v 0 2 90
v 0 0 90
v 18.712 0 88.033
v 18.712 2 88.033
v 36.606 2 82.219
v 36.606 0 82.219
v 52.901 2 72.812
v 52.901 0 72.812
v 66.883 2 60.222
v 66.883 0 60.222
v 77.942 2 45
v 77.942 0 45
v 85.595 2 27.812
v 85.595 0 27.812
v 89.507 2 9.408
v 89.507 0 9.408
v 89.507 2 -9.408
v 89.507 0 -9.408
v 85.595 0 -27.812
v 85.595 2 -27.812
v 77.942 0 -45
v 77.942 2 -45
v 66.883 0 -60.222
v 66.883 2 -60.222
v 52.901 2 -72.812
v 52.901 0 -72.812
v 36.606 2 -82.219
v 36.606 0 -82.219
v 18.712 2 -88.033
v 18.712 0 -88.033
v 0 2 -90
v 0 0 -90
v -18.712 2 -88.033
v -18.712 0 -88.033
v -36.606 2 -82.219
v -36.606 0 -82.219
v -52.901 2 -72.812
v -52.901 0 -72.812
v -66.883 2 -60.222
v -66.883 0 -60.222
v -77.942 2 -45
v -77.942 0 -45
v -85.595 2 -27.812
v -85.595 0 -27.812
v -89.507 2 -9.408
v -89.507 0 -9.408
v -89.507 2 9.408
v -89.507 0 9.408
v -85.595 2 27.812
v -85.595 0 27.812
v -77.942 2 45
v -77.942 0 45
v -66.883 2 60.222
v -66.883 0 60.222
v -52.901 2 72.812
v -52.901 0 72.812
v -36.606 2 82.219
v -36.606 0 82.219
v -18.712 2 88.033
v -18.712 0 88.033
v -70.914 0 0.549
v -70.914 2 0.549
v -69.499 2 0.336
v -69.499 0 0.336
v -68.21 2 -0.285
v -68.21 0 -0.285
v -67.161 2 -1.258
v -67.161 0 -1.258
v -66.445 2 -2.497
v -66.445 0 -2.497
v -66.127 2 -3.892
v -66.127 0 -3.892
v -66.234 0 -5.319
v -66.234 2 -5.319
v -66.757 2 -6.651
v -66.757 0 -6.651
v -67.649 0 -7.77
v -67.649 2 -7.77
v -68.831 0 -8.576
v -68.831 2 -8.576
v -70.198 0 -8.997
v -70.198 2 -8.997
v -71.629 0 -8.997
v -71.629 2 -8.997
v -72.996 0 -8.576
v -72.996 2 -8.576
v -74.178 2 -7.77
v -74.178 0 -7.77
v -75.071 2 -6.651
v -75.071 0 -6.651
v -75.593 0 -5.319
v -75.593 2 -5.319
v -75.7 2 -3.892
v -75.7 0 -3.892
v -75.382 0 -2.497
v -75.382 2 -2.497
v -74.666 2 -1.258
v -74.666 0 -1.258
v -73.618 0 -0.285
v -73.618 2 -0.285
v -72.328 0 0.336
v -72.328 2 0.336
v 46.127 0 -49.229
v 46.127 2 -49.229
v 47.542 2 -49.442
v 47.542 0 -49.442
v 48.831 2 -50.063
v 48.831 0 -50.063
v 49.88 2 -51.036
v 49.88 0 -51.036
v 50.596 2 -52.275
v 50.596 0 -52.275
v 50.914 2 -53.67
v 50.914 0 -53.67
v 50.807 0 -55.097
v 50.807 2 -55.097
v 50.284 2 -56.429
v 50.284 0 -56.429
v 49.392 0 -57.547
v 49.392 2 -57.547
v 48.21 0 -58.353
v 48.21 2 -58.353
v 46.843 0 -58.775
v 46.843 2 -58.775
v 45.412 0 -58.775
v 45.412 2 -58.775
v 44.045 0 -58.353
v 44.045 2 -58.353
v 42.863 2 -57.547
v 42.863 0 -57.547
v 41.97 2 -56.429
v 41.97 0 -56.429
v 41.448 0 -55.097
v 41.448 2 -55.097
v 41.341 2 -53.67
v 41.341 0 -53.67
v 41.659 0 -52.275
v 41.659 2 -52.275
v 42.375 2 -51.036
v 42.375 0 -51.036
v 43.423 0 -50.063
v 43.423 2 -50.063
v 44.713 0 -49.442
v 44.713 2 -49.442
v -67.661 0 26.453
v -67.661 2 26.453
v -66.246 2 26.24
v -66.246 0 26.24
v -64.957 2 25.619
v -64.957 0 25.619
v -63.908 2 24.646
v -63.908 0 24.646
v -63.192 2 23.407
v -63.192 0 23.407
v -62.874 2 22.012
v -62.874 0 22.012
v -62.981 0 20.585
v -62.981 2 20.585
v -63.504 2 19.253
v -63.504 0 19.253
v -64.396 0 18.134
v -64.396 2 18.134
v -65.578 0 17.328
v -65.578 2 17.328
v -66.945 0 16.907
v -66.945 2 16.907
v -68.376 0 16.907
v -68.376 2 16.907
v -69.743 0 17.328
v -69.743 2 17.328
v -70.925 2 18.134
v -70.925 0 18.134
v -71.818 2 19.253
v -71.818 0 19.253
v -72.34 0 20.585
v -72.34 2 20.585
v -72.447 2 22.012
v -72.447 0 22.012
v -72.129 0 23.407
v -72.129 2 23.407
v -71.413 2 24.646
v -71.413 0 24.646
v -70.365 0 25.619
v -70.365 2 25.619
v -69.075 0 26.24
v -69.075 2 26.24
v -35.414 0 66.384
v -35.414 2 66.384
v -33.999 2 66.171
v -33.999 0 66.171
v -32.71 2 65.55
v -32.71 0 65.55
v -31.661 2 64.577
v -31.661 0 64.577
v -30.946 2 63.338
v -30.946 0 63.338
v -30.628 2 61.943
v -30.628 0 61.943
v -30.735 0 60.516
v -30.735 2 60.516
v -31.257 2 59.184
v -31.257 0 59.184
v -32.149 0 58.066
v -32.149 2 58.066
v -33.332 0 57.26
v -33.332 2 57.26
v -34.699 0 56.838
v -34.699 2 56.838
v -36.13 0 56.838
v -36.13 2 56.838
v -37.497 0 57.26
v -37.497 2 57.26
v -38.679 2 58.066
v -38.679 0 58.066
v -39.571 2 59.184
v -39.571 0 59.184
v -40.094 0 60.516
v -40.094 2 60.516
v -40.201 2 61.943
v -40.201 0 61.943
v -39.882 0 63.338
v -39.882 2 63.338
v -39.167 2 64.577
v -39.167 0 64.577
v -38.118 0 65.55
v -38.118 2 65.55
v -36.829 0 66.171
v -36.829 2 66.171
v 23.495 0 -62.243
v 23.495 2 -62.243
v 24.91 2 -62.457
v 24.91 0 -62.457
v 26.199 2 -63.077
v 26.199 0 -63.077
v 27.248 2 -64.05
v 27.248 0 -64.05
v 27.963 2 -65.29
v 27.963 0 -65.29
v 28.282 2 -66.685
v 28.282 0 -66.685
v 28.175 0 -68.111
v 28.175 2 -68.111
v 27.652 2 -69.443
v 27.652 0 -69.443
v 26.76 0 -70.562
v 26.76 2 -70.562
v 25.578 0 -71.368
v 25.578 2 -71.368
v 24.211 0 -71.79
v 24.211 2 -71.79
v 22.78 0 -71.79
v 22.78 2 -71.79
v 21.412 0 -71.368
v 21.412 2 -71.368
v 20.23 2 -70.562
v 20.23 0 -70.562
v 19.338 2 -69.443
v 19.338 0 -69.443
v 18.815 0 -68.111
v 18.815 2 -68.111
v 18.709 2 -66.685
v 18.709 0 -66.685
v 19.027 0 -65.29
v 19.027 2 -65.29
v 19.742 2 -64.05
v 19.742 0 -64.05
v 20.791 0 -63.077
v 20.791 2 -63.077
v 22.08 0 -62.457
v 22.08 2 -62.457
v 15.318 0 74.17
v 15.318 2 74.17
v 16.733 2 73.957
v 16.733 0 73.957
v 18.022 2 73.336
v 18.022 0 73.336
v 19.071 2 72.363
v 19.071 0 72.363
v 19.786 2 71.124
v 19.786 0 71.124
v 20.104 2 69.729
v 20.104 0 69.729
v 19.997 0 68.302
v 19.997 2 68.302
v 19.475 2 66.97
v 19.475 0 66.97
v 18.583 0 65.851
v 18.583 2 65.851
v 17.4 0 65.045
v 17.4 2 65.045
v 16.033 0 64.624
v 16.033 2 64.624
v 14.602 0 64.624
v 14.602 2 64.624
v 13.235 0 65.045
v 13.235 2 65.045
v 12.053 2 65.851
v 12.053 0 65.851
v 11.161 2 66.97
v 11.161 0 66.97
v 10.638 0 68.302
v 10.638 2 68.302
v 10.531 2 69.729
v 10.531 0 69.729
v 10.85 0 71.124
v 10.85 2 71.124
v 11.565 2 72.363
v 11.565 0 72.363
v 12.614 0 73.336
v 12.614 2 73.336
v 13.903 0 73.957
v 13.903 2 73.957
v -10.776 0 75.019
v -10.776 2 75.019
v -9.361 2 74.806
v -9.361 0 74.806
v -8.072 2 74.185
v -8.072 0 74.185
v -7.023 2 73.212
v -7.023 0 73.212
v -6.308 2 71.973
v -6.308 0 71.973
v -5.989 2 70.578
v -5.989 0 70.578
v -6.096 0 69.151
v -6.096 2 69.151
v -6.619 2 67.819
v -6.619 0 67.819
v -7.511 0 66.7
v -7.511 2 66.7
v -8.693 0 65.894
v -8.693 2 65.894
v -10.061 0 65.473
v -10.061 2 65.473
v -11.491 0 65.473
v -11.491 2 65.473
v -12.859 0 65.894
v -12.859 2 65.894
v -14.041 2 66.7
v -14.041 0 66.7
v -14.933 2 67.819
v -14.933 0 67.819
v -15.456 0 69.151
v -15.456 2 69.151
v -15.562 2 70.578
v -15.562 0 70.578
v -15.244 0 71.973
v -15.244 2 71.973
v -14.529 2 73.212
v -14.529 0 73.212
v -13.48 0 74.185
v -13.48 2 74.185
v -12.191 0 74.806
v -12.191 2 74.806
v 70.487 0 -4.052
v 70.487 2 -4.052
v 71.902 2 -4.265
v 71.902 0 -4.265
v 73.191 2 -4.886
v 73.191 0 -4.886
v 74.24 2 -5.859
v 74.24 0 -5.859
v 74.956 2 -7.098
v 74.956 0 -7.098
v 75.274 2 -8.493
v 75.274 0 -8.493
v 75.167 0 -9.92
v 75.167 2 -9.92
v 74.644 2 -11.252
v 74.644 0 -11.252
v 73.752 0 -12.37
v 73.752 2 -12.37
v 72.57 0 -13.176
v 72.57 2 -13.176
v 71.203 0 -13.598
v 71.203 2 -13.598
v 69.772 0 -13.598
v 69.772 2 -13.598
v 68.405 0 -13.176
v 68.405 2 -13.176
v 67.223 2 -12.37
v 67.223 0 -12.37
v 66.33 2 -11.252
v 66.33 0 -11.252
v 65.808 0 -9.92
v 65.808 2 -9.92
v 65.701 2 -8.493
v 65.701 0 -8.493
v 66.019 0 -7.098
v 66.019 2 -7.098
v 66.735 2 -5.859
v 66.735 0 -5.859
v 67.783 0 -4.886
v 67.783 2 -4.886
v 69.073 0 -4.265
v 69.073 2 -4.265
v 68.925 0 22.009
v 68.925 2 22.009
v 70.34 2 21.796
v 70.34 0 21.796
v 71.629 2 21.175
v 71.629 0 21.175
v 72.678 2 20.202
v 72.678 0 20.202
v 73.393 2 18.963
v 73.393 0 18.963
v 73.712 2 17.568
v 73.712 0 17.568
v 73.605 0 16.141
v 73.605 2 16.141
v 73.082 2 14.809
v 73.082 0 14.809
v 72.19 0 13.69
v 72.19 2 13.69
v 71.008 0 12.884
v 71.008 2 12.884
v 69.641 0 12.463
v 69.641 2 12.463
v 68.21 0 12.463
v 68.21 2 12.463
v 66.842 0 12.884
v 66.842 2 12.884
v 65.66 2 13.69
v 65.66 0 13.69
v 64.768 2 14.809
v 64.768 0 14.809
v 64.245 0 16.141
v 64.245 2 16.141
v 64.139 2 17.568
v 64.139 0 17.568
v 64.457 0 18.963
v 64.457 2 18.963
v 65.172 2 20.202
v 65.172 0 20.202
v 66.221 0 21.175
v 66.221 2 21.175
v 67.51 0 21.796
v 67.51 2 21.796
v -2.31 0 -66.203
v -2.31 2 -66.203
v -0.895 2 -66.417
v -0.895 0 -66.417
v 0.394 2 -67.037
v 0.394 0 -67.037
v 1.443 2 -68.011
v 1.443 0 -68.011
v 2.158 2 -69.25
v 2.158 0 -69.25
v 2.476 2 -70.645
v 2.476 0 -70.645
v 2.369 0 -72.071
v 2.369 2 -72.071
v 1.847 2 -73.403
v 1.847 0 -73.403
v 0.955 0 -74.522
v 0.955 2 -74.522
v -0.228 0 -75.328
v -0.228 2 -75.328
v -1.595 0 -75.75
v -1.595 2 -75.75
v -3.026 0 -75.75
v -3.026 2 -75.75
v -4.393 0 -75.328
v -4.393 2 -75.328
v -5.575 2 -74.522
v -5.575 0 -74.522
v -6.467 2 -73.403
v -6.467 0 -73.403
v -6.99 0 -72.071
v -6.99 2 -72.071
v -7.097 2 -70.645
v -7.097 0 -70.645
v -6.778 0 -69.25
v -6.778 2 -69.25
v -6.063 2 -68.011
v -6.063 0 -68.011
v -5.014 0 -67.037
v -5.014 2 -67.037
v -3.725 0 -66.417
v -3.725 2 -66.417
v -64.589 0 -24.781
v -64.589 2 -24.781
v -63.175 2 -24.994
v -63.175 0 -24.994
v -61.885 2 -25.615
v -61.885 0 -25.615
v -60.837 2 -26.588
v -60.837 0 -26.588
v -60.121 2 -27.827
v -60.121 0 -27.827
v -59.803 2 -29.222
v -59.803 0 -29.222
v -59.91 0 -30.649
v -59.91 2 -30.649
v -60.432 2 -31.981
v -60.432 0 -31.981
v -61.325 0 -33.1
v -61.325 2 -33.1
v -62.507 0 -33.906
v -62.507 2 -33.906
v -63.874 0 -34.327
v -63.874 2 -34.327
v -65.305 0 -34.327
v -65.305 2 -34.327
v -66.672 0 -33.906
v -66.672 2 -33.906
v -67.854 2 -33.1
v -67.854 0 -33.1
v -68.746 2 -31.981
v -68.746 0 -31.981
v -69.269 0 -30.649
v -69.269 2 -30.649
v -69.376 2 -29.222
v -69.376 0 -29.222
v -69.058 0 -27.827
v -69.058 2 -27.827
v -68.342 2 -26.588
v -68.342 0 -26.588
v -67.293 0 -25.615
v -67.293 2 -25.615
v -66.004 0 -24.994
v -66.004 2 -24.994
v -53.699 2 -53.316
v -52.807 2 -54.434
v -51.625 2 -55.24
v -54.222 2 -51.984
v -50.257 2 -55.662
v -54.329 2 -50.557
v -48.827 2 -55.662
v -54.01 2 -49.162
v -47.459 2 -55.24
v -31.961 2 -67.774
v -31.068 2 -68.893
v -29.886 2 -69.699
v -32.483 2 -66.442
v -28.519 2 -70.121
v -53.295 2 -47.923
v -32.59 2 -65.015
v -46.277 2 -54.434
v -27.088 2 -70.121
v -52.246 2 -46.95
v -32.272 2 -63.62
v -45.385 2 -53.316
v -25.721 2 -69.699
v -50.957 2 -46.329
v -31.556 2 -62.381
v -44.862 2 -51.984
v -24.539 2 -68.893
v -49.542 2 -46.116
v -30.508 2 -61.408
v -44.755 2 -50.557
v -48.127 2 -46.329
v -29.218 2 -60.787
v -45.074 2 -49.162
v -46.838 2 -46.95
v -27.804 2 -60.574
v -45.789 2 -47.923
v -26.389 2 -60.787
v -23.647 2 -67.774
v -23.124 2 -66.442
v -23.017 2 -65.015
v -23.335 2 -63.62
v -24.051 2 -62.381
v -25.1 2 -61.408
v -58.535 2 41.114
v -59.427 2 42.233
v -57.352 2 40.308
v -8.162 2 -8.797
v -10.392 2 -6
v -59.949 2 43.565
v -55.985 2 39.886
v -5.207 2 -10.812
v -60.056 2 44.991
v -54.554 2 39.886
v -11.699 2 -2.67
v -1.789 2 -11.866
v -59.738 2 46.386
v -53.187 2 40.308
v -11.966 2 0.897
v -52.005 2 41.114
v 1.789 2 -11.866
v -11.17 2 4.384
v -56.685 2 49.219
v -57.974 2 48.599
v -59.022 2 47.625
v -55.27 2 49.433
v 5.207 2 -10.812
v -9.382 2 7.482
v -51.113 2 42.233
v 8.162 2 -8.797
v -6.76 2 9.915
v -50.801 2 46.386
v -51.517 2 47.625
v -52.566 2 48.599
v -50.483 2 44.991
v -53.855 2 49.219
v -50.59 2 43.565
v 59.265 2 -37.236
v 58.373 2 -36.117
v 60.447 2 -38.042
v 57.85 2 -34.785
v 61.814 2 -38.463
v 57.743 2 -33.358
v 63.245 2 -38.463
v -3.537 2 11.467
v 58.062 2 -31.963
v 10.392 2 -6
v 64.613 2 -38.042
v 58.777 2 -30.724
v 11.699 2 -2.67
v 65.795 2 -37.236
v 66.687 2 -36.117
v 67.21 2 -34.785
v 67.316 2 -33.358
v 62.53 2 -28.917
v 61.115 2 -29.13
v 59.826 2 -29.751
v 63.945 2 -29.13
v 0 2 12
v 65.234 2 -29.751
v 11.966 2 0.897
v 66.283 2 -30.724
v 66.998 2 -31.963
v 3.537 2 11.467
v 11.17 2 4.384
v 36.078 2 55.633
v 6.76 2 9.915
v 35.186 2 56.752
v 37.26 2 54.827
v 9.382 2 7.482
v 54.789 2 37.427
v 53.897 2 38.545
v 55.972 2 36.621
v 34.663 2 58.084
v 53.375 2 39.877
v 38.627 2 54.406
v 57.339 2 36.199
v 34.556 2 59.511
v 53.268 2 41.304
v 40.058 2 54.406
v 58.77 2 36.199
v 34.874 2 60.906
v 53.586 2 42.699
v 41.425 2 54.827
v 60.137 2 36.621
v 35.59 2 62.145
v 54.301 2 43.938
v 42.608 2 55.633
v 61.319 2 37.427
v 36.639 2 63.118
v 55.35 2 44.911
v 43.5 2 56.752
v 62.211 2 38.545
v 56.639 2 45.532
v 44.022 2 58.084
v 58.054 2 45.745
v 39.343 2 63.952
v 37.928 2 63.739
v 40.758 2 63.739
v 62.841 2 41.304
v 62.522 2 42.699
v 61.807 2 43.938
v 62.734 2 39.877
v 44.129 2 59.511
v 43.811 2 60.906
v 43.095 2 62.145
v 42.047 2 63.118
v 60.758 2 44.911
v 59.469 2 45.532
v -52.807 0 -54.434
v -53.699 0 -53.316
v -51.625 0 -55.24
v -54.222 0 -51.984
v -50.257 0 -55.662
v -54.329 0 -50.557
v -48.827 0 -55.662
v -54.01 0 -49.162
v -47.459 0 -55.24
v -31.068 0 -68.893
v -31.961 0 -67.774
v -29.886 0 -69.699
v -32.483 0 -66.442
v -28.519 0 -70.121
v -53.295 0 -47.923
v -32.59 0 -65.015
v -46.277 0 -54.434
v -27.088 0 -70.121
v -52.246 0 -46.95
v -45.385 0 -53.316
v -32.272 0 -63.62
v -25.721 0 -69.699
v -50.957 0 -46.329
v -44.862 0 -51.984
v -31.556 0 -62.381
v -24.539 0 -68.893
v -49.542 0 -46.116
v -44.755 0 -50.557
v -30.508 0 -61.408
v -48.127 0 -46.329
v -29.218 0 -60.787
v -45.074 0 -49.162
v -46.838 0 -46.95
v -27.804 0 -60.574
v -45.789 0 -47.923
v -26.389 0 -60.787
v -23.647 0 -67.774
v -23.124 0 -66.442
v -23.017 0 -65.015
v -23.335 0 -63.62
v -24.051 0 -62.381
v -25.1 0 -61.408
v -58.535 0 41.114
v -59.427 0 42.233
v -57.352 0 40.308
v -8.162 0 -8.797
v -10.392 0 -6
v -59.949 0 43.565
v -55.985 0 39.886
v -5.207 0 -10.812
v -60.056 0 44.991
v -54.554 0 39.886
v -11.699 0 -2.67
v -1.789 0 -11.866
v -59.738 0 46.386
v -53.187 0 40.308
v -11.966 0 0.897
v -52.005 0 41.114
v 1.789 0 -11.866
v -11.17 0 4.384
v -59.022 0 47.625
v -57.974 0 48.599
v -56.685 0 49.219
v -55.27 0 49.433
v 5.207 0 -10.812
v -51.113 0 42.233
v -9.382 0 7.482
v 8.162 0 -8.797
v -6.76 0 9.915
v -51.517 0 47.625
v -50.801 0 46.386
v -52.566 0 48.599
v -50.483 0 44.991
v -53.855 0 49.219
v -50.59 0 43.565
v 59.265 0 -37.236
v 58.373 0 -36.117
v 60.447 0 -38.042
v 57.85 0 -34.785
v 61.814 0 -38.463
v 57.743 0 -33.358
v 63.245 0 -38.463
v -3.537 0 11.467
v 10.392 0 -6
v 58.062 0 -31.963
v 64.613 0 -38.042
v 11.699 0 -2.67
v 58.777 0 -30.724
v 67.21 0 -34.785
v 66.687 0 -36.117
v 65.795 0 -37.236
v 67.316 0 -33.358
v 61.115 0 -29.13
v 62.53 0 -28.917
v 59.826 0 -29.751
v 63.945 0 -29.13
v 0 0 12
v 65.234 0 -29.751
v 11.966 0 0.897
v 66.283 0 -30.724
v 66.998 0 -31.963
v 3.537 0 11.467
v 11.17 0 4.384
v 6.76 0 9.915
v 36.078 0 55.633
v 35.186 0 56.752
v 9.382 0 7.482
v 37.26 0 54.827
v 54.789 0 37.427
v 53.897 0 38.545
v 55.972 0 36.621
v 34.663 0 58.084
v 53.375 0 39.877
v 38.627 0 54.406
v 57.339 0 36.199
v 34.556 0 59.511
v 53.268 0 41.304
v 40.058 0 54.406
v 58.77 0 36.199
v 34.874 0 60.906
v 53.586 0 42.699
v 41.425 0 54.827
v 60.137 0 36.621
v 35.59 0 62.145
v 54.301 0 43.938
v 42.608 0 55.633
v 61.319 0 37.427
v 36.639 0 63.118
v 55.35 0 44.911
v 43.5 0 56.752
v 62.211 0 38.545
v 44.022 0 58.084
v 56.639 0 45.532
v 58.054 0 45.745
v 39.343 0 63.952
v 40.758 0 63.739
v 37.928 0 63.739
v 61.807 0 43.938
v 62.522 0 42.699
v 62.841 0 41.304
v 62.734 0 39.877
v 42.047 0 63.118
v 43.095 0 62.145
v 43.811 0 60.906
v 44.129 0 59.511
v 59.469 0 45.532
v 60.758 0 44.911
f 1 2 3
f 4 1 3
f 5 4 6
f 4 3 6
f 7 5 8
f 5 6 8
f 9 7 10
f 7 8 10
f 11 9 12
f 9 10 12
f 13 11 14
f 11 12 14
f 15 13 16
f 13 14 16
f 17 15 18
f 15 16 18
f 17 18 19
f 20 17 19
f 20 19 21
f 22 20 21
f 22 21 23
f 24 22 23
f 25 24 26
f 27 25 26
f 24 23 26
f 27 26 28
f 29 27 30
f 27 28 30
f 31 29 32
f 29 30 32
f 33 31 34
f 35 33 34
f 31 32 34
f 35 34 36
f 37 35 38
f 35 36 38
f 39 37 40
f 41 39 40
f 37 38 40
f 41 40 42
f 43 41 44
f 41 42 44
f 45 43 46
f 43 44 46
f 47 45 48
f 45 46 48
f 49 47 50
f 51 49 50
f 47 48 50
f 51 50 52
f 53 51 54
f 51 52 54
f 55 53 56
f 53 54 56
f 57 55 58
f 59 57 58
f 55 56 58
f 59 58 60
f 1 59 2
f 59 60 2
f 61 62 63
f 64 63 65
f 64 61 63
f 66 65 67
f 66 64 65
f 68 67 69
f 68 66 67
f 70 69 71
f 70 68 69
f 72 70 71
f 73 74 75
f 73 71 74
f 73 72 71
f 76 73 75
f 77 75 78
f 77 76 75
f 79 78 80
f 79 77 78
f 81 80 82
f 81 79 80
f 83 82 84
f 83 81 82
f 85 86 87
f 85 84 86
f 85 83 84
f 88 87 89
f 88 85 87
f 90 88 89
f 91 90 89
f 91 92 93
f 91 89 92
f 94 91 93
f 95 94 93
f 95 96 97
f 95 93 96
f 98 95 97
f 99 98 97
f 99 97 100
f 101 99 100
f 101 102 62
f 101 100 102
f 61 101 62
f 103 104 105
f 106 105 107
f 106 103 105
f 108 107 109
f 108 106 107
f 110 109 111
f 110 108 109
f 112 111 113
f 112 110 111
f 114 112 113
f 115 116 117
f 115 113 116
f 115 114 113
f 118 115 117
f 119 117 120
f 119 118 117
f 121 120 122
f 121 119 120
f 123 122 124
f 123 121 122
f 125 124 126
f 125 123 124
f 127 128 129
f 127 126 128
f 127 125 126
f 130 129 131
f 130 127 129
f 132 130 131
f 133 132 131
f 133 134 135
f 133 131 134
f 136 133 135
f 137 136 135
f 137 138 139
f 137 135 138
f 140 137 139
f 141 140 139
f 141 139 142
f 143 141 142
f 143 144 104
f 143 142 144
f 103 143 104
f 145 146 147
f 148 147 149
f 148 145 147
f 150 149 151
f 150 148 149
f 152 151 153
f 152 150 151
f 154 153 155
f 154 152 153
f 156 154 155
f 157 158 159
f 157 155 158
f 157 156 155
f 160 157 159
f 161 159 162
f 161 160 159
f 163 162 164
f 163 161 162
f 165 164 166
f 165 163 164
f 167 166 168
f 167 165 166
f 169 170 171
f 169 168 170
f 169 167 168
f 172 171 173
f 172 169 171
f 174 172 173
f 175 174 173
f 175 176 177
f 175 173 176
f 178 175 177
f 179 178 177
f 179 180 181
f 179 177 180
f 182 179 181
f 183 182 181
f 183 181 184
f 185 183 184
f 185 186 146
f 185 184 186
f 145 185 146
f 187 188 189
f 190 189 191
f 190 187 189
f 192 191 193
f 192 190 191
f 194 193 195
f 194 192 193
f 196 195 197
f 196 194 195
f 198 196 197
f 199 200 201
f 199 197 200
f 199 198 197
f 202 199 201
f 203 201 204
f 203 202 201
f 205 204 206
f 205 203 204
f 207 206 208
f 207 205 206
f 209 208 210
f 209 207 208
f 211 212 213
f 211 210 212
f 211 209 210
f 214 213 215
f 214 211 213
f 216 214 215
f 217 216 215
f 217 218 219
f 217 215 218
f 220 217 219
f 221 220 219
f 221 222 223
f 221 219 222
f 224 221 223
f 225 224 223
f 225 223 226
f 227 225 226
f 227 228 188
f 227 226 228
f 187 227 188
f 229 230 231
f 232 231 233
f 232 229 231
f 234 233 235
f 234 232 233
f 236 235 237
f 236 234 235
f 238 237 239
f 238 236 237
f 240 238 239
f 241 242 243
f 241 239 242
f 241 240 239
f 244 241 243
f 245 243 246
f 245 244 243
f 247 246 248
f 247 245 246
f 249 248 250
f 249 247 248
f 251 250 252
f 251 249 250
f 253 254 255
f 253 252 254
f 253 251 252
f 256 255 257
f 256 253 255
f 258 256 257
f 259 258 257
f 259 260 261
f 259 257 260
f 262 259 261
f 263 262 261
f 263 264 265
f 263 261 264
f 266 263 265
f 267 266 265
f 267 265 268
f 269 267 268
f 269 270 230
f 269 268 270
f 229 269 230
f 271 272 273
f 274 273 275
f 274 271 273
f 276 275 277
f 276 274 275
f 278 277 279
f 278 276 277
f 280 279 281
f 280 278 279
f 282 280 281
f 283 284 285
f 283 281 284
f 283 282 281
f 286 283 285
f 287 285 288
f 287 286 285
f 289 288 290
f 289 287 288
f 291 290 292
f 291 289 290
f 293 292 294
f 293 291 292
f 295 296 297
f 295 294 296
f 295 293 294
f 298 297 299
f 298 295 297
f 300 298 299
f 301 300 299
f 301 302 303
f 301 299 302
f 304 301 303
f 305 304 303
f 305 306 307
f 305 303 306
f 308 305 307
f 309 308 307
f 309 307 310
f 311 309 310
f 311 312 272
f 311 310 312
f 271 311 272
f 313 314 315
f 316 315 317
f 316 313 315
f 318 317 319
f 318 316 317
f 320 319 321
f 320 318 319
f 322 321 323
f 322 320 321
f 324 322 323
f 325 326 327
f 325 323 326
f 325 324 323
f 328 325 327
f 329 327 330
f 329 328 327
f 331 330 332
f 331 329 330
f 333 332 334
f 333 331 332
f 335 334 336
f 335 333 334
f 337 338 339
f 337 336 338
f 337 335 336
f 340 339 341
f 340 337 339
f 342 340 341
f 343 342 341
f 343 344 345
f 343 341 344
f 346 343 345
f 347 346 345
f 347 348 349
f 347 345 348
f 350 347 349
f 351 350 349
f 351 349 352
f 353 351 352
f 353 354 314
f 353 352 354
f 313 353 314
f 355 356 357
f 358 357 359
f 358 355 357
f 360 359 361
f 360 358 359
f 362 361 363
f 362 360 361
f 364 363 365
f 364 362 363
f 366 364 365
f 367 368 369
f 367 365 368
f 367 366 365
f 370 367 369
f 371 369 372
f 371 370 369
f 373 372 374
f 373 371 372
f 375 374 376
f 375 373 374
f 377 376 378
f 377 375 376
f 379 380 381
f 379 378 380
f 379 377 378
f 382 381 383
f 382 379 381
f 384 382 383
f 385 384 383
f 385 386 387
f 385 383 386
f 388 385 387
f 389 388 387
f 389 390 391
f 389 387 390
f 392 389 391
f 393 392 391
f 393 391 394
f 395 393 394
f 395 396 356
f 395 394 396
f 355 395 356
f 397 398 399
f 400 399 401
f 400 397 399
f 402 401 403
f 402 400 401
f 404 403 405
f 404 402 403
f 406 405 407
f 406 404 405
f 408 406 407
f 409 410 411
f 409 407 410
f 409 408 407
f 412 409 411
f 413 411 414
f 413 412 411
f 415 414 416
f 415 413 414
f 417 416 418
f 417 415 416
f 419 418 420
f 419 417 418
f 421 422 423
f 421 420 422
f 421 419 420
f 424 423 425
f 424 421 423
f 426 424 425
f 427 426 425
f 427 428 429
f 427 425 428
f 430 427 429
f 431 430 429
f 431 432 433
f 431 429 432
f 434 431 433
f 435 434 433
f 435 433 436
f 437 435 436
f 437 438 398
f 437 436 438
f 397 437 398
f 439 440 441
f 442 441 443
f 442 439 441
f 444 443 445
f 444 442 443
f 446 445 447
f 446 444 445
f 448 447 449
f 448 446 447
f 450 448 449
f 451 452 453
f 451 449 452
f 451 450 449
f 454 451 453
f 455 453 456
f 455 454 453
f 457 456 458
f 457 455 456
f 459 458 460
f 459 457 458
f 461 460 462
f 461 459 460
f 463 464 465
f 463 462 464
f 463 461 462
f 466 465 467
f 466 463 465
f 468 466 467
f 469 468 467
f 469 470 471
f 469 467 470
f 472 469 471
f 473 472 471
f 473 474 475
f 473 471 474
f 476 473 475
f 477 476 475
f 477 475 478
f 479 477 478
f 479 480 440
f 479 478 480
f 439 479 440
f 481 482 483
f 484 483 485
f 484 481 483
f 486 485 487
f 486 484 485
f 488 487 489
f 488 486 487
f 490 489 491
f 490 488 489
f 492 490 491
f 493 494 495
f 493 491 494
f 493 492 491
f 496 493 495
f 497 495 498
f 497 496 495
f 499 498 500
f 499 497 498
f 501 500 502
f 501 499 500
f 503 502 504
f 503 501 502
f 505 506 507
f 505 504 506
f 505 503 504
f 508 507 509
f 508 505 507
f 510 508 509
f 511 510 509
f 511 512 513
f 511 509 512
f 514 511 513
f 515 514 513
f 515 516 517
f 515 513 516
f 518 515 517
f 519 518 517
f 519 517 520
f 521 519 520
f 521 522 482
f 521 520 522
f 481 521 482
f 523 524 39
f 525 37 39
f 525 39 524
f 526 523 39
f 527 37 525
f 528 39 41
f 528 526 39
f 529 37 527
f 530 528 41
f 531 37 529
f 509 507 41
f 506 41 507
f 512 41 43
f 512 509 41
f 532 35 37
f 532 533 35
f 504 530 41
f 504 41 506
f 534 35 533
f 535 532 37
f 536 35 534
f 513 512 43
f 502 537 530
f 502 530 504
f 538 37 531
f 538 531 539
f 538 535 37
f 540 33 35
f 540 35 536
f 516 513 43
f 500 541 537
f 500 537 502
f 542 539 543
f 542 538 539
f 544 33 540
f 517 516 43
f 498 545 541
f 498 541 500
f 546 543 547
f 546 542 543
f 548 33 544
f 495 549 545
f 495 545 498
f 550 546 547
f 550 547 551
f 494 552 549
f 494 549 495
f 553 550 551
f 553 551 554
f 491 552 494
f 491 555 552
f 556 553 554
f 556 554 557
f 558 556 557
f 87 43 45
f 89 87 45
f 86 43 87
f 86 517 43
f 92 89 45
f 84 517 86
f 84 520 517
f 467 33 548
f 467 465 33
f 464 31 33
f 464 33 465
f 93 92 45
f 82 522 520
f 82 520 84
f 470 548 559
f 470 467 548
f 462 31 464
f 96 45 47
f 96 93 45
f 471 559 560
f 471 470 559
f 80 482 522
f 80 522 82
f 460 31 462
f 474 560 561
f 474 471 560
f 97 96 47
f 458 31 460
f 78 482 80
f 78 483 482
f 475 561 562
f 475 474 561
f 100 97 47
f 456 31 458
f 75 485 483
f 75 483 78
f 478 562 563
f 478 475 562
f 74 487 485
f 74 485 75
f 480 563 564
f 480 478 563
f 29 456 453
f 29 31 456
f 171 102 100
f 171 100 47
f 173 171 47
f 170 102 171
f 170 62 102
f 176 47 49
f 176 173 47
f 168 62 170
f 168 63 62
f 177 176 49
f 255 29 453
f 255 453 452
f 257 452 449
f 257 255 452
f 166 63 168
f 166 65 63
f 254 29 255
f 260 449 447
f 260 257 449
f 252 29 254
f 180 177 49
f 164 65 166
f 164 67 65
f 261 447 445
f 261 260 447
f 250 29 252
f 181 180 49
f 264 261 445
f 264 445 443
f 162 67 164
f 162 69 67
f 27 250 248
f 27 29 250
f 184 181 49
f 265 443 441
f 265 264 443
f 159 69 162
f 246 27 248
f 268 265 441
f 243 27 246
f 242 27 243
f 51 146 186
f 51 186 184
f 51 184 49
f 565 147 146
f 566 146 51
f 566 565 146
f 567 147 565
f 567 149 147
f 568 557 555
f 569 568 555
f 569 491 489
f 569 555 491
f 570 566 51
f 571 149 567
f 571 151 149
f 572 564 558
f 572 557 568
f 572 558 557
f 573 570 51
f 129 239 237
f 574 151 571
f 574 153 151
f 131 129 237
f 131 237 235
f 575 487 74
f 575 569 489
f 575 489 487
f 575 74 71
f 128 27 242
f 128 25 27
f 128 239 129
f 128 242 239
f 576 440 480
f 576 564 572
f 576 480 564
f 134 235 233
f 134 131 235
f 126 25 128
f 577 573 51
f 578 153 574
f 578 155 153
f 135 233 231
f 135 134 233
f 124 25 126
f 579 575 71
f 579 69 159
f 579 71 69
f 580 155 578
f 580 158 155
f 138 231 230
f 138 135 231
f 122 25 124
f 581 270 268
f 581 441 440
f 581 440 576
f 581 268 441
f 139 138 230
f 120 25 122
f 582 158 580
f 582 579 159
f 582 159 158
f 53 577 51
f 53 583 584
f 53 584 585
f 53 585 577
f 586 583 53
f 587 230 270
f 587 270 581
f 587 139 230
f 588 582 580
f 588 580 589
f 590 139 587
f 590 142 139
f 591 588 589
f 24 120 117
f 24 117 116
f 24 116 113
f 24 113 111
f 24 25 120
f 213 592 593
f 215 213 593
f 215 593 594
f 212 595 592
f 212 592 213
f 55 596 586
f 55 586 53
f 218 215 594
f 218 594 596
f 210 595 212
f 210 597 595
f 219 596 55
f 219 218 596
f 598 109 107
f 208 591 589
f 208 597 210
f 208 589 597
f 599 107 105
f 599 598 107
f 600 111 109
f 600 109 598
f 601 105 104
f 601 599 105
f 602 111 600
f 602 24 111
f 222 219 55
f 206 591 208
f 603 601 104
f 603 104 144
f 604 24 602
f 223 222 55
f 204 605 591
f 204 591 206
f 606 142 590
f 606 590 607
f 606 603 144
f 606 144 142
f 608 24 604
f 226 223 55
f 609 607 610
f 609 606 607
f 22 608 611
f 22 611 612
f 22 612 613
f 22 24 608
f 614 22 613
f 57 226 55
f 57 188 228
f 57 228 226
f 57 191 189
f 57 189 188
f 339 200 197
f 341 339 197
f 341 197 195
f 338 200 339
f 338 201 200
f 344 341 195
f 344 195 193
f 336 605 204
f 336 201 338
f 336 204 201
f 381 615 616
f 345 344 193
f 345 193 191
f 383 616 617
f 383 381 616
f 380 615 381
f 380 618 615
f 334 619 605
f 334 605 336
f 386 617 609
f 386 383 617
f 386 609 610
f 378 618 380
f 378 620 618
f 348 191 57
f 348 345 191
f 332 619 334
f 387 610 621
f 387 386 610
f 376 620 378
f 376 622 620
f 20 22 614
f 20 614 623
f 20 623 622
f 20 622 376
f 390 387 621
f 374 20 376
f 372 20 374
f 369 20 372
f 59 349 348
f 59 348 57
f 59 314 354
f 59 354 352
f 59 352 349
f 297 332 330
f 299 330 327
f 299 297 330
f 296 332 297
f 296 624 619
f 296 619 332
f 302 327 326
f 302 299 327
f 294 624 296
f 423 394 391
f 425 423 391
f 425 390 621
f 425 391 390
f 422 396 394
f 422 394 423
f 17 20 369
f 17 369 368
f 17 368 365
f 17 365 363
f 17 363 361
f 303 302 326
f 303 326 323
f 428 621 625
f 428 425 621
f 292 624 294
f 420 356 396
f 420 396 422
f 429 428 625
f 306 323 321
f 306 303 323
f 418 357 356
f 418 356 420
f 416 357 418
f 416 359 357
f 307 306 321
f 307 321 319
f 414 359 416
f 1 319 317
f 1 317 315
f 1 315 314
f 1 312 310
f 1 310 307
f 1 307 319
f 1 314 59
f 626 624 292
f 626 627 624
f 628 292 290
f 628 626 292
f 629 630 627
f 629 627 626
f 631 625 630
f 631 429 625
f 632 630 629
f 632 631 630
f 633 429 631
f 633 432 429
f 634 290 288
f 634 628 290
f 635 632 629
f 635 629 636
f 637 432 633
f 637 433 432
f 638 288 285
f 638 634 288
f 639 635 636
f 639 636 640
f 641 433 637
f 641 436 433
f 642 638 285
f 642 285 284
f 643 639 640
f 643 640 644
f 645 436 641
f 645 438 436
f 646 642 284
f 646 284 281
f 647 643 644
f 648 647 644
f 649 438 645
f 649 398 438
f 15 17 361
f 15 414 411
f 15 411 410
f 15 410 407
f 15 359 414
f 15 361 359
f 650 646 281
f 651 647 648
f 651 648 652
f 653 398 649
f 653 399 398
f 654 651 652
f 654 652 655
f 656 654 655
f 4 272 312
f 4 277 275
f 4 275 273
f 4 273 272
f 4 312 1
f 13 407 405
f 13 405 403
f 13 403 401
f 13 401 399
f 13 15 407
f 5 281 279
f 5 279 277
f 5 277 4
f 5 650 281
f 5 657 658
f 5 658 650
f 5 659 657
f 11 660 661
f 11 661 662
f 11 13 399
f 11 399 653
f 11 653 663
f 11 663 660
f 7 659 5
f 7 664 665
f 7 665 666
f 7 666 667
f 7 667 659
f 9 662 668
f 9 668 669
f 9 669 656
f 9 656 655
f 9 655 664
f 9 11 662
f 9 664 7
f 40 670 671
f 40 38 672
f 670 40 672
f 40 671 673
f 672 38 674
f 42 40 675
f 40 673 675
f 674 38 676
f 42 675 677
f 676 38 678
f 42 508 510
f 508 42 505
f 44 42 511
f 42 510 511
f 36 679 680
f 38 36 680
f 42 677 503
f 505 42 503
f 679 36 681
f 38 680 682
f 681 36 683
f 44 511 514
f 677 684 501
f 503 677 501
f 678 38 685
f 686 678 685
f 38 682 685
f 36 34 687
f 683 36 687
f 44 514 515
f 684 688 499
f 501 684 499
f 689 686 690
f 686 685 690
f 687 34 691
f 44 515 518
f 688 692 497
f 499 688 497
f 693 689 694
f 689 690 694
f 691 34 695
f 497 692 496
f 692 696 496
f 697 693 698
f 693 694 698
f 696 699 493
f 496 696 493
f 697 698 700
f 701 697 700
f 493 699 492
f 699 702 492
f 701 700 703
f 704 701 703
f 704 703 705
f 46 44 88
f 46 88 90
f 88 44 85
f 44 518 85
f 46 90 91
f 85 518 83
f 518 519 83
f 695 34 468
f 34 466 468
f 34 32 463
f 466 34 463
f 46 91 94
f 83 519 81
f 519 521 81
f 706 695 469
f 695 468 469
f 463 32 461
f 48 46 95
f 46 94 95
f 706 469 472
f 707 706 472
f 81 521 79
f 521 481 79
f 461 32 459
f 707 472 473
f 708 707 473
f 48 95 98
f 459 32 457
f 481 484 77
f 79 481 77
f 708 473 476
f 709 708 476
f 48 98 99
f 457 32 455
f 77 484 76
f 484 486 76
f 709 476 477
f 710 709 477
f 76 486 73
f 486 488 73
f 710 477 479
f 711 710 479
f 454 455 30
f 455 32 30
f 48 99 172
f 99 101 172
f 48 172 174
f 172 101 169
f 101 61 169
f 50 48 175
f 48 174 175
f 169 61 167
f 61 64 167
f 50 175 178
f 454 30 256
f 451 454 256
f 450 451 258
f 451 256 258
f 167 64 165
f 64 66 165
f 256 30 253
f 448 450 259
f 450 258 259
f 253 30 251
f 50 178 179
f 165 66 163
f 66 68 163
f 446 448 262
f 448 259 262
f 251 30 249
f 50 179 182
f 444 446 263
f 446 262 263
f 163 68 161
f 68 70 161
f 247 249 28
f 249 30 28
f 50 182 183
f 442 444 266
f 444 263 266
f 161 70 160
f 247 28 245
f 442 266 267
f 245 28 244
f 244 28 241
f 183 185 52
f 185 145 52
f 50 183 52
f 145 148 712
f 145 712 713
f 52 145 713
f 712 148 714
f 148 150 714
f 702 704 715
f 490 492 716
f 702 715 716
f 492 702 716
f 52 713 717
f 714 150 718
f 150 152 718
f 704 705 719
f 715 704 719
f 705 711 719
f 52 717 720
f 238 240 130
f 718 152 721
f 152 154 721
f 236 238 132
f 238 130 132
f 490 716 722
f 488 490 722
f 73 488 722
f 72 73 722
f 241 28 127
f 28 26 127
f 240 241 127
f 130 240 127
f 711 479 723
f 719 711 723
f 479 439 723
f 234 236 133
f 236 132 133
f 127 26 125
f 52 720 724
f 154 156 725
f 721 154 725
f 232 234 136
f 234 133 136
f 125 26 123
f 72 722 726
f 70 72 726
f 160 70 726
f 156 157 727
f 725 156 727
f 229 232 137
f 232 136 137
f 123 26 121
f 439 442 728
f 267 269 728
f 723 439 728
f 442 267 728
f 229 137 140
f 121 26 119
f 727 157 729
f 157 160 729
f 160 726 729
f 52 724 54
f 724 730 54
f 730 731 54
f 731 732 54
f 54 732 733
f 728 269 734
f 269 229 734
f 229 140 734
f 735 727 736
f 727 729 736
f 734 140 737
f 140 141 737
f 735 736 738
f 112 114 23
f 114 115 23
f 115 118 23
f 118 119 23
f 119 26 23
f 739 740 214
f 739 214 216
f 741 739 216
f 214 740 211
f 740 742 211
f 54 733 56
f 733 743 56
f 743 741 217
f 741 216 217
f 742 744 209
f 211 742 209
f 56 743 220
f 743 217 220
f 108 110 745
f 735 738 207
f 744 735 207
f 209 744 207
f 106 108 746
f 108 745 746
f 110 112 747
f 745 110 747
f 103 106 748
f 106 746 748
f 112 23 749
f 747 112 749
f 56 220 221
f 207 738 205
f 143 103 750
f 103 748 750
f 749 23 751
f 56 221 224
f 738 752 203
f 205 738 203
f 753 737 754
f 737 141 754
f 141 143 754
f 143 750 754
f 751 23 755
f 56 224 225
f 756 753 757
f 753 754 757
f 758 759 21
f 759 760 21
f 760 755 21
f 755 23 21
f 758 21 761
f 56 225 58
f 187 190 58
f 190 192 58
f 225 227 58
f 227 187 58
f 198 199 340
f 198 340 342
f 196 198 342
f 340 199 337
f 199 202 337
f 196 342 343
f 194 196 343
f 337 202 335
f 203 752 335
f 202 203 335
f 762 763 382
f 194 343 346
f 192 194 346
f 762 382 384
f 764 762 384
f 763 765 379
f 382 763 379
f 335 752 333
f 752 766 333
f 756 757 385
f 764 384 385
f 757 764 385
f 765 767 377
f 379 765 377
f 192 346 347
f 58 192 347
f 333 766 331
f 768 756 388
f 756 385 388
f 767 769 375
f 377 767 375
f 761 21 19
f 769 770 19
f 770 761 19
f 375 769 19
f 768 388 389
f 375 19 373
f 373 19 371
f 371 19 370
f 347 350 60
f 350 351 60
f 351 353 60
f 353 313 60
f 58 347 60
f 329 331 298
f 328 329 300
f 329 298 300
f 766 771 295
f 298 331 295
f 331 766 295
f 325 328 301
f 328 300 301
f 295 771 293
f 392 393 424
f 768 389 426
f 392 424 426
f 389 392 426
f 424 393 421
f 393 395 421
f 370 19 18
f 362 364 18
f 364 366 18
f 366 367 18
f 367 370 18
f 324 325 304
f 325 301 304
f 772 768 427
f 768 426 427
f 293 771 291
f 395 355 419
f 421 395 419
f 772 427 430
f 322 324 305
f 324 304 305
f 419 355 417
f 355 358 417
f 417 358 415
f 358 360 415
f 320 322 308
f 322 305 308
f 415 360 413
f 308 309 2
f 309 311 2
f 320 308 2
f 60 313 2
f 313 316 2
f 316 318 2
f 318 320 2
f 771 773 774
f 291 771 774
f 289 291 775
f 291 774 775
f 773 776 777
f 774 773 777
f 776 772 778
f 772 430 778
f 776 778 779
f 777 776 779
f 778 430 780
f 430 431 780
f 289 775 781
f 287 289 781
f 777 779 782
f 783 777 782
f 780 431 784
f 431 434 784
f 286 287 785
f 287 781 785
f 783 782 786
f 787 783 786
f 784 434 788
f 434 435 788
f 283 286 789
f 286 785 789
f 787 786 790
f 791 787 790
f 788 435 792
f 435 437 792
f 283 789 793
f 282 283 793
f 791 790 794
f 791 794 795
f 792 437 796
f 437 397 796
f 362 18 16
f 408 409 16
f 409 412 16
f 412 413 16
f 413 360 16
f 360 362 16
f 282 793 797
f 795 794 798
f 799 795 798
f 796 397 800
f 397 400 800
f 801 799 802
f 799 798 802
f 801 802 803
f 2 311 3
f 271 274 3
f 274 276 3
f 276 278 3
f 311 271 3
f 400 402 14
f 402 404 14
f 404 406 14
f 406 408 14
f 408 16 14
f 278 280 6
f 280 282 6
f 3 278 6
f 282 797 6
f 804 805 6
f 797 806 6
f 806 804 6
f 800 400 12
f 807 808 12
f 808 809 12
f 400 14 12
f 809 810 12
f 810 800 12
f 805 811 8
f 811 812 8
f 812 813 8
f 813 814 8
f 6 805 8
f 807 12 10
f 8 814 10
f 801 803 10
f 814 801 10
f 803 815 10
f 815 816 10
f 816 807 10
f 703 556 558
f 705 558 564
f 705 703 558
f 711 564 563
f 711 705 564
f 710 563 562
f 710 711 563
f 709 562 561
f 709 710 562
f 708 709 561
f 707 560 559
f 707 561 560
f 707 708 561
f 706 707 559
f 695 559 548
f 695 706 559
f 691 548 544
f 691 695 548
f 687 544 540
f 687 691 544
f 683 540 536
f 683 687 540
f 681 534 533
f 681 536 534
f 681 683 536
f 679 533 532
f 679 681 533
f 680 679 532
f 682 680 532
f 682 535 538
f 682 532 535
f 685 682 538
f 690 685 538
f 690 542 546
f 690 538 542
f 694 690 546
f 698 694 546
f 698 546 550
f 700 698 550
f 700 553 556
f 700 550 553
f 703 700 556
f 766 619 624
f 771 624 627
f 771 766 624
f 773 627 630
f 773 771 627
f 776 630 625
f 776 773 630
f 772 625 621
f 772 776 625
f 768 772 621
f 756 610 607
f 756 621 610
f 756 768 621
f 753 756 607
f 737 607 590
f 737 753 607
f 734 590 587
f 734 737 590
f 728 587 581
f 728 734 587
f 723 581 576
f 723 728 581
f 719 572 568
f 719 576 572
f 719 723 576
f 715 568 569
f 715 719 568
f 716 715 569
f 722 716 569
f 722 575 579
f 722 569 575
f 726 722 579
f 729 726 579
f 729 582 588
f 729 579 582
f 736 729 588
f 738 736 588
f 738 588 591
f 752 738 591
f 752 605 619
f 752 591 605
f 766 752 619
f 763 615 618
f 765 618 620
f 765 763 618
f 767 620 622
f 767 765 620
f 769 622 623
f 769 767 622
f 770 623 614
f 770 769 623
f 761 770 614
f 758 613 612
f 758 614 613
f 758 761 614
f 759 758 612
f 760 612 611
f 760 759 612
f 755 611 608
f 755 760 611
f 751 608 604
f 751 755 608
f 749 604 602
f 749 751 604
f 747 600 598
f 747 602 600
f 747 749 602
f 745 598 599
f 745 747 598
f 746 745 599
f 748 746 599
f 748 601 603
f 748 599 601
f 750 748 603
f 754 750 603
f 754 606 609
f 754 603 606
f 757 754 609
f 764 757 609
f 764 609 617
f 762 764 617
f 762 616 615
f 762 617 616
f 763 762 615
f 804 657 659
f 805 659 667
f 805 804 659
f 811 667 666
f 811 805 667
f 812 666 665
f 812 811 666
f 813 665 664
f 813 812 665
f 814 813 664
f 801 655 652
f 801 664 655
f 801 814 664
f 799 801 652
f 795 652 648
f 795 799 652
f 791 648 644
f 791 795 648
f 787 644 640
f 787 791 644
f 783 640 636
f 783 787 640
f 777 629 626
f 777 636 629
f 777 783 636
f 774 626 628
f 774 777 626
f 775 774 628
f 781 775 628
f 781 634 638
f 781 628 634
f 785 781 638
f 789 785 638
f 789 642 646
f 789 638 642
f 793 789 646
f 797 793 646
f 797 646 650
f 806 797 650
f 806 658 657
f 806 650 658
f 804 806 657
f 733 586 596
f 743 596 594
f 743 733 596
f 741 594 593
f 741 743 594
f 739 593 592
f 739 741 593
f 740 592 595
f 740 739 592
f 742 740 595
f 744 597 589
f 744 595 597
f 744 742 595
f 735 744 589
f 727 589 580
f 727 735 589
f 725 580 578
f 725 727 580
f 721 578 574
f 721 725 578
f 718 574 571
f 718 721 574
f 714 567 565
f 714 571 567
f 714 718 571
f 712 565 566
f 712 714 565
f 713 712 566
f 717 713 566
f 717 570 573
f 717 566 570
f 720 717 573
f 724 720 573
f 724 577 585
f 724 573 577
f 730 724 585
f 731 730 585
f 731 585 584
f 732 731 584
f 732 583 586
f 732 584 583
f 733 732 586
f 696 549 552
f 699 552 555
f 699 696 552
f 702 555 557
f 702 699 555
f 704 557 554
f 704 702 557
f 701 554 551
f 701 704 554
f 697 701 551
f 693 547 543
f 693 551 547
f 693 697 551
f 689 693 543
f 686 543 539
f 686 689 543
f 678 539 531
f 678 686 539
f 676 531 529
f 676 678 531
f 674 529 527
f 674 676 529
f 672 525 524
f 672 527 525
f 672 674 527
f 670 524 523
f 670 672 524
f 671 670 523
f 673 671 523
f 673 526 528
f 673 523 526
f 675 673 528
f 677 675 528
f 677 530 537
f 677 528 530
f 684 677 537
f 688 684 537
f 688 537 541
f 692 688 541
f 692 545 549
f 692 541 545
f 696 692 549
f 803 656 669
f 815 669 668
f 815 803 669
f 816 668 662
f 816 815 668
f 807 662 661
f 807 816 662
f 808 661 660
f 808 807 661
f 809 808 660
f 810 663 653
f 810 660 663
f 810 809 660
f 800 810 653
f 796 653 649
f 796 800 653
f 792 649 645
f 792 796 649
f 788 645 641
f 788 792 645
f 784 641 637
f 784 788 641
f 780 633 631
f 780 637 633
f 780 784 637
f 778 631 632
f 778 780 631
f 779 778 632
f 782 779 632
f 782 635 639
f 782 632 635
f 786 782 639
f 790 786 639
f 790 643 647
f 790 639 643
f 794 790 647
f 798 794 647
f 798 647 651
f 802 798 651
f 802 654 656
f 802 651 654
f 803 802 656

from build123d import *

# Parameters (mm, degrees)
SKETCH_1_R          = 90
EXTRUDE_1_DEPTH     = 2
SKETCH_2_R          = 4.8
SKETCH_2_R_2        = 12
CUT_EXTRUDE_3_DEPTH = 128.294933128


with BuildPart() as part:
    # Эскиз1 → Вытянуть1 (new body)
    with BuildSketch(Plane(origin=(0, 0, 0), x_dir=(1, 0, 0), z_dir=(0, 1, 0))):
        with Locations(Location((0, 0, 0), (0, 0, 270))):
            Circle(SKETCH_1_R)
    extrude(amount=EXTRUDE_1_DEPTH)

    # Эскиз2 → Вырез-Вытянуть3 (cut, through all)
    with BuildSketch(Plane(origin=(0, 0, 0), x_dir=(1, 0, 0), z_dir=(0, 1, 0))):
        with Locations(Location((68.925113062, -17.208935516, 0), (0, 0, 270))):
            Circle(SKETCH_2_R)
        with Locations(Location((58.0541693, -40.945477151, 0), (0, 0, 270))):
            Circle(SKETCH_2_R)
        with Locations(Location((39.342688284, -59.15210521, 0), (0, 0, 270))):
            Circle(SKETCH_2_R)
        with Locations(Location((15.317759211, -69.369913687, 0), (0, 0, 270))):
            Circle(SKETCH_2_R)
        with Locations(Location((-10.775918123, -70.218930929, 0), (0, 0, 270))):
            Circle(SKETCH_2_R)
        with Locations(Location((-35.414248003, -61.584492452, 0), (0, 0, 270))):
            Circle(SKETCH_2_R)
        with Locations(Location((-55.269687452, -44.632727018, 0), (0, 0, 270))):
            Circle(SKETCH_2_R)
        with Locations(Location((-67.660649352, -21.653064482, 0), (0, 0, 270))):
            Circle(SKETCH_2_R)
        with Locations(Location((-70.913665636, 4.250964396, 0), (0, 0, 270))):
            Circle(SKETCH_2_R)
        with Locations(Location((-64.589398429, 29.580876977, 0), (0, 0, 270))):
            Circle(SKETCH_2_R)
        with Locations(Location((-49.541975063, 50.915728209, 0), (0, 0, 270))):
            Circle(SKETCH_2_R)
        with Locations(Location((-27.803633442, 65.374128213, 0), (0, 0, 270))):
            Circle(SKETCH_2_R)
        with Locations(Location((-2.31025706, 71.003389951, 0), (0, 0, 270))):
            Circle(SKETCH_2_R)
        with Locations(Location((23.495132339, 67.043250433, 0), (0, 0, 270))):
            Circle(SKETCH_2_R)
        with Locations(Location((46.127373925, 54.028548444, 0), (0, 0, 270))):
            Circle(SKETCH_2_R)
        with Locations(Location((62.529858062, 33.716991605, 0), (0, 0, 270))):
            Circle(SKETCH_2_R)
        with Locations(Location((70.487338378, 8.851768218, 0), (0, 0, 270))):
            Circle(SKETCH_2_R)
        with Locations(Location((0, 0, 0), (0, 0, 270))):
            Circle(SKETCH_2_R_2)
    extrude(amount=CUT_EXTRUDE_3_DEPTH, mode=Mode.SUBTRACT)


solid = part.part
